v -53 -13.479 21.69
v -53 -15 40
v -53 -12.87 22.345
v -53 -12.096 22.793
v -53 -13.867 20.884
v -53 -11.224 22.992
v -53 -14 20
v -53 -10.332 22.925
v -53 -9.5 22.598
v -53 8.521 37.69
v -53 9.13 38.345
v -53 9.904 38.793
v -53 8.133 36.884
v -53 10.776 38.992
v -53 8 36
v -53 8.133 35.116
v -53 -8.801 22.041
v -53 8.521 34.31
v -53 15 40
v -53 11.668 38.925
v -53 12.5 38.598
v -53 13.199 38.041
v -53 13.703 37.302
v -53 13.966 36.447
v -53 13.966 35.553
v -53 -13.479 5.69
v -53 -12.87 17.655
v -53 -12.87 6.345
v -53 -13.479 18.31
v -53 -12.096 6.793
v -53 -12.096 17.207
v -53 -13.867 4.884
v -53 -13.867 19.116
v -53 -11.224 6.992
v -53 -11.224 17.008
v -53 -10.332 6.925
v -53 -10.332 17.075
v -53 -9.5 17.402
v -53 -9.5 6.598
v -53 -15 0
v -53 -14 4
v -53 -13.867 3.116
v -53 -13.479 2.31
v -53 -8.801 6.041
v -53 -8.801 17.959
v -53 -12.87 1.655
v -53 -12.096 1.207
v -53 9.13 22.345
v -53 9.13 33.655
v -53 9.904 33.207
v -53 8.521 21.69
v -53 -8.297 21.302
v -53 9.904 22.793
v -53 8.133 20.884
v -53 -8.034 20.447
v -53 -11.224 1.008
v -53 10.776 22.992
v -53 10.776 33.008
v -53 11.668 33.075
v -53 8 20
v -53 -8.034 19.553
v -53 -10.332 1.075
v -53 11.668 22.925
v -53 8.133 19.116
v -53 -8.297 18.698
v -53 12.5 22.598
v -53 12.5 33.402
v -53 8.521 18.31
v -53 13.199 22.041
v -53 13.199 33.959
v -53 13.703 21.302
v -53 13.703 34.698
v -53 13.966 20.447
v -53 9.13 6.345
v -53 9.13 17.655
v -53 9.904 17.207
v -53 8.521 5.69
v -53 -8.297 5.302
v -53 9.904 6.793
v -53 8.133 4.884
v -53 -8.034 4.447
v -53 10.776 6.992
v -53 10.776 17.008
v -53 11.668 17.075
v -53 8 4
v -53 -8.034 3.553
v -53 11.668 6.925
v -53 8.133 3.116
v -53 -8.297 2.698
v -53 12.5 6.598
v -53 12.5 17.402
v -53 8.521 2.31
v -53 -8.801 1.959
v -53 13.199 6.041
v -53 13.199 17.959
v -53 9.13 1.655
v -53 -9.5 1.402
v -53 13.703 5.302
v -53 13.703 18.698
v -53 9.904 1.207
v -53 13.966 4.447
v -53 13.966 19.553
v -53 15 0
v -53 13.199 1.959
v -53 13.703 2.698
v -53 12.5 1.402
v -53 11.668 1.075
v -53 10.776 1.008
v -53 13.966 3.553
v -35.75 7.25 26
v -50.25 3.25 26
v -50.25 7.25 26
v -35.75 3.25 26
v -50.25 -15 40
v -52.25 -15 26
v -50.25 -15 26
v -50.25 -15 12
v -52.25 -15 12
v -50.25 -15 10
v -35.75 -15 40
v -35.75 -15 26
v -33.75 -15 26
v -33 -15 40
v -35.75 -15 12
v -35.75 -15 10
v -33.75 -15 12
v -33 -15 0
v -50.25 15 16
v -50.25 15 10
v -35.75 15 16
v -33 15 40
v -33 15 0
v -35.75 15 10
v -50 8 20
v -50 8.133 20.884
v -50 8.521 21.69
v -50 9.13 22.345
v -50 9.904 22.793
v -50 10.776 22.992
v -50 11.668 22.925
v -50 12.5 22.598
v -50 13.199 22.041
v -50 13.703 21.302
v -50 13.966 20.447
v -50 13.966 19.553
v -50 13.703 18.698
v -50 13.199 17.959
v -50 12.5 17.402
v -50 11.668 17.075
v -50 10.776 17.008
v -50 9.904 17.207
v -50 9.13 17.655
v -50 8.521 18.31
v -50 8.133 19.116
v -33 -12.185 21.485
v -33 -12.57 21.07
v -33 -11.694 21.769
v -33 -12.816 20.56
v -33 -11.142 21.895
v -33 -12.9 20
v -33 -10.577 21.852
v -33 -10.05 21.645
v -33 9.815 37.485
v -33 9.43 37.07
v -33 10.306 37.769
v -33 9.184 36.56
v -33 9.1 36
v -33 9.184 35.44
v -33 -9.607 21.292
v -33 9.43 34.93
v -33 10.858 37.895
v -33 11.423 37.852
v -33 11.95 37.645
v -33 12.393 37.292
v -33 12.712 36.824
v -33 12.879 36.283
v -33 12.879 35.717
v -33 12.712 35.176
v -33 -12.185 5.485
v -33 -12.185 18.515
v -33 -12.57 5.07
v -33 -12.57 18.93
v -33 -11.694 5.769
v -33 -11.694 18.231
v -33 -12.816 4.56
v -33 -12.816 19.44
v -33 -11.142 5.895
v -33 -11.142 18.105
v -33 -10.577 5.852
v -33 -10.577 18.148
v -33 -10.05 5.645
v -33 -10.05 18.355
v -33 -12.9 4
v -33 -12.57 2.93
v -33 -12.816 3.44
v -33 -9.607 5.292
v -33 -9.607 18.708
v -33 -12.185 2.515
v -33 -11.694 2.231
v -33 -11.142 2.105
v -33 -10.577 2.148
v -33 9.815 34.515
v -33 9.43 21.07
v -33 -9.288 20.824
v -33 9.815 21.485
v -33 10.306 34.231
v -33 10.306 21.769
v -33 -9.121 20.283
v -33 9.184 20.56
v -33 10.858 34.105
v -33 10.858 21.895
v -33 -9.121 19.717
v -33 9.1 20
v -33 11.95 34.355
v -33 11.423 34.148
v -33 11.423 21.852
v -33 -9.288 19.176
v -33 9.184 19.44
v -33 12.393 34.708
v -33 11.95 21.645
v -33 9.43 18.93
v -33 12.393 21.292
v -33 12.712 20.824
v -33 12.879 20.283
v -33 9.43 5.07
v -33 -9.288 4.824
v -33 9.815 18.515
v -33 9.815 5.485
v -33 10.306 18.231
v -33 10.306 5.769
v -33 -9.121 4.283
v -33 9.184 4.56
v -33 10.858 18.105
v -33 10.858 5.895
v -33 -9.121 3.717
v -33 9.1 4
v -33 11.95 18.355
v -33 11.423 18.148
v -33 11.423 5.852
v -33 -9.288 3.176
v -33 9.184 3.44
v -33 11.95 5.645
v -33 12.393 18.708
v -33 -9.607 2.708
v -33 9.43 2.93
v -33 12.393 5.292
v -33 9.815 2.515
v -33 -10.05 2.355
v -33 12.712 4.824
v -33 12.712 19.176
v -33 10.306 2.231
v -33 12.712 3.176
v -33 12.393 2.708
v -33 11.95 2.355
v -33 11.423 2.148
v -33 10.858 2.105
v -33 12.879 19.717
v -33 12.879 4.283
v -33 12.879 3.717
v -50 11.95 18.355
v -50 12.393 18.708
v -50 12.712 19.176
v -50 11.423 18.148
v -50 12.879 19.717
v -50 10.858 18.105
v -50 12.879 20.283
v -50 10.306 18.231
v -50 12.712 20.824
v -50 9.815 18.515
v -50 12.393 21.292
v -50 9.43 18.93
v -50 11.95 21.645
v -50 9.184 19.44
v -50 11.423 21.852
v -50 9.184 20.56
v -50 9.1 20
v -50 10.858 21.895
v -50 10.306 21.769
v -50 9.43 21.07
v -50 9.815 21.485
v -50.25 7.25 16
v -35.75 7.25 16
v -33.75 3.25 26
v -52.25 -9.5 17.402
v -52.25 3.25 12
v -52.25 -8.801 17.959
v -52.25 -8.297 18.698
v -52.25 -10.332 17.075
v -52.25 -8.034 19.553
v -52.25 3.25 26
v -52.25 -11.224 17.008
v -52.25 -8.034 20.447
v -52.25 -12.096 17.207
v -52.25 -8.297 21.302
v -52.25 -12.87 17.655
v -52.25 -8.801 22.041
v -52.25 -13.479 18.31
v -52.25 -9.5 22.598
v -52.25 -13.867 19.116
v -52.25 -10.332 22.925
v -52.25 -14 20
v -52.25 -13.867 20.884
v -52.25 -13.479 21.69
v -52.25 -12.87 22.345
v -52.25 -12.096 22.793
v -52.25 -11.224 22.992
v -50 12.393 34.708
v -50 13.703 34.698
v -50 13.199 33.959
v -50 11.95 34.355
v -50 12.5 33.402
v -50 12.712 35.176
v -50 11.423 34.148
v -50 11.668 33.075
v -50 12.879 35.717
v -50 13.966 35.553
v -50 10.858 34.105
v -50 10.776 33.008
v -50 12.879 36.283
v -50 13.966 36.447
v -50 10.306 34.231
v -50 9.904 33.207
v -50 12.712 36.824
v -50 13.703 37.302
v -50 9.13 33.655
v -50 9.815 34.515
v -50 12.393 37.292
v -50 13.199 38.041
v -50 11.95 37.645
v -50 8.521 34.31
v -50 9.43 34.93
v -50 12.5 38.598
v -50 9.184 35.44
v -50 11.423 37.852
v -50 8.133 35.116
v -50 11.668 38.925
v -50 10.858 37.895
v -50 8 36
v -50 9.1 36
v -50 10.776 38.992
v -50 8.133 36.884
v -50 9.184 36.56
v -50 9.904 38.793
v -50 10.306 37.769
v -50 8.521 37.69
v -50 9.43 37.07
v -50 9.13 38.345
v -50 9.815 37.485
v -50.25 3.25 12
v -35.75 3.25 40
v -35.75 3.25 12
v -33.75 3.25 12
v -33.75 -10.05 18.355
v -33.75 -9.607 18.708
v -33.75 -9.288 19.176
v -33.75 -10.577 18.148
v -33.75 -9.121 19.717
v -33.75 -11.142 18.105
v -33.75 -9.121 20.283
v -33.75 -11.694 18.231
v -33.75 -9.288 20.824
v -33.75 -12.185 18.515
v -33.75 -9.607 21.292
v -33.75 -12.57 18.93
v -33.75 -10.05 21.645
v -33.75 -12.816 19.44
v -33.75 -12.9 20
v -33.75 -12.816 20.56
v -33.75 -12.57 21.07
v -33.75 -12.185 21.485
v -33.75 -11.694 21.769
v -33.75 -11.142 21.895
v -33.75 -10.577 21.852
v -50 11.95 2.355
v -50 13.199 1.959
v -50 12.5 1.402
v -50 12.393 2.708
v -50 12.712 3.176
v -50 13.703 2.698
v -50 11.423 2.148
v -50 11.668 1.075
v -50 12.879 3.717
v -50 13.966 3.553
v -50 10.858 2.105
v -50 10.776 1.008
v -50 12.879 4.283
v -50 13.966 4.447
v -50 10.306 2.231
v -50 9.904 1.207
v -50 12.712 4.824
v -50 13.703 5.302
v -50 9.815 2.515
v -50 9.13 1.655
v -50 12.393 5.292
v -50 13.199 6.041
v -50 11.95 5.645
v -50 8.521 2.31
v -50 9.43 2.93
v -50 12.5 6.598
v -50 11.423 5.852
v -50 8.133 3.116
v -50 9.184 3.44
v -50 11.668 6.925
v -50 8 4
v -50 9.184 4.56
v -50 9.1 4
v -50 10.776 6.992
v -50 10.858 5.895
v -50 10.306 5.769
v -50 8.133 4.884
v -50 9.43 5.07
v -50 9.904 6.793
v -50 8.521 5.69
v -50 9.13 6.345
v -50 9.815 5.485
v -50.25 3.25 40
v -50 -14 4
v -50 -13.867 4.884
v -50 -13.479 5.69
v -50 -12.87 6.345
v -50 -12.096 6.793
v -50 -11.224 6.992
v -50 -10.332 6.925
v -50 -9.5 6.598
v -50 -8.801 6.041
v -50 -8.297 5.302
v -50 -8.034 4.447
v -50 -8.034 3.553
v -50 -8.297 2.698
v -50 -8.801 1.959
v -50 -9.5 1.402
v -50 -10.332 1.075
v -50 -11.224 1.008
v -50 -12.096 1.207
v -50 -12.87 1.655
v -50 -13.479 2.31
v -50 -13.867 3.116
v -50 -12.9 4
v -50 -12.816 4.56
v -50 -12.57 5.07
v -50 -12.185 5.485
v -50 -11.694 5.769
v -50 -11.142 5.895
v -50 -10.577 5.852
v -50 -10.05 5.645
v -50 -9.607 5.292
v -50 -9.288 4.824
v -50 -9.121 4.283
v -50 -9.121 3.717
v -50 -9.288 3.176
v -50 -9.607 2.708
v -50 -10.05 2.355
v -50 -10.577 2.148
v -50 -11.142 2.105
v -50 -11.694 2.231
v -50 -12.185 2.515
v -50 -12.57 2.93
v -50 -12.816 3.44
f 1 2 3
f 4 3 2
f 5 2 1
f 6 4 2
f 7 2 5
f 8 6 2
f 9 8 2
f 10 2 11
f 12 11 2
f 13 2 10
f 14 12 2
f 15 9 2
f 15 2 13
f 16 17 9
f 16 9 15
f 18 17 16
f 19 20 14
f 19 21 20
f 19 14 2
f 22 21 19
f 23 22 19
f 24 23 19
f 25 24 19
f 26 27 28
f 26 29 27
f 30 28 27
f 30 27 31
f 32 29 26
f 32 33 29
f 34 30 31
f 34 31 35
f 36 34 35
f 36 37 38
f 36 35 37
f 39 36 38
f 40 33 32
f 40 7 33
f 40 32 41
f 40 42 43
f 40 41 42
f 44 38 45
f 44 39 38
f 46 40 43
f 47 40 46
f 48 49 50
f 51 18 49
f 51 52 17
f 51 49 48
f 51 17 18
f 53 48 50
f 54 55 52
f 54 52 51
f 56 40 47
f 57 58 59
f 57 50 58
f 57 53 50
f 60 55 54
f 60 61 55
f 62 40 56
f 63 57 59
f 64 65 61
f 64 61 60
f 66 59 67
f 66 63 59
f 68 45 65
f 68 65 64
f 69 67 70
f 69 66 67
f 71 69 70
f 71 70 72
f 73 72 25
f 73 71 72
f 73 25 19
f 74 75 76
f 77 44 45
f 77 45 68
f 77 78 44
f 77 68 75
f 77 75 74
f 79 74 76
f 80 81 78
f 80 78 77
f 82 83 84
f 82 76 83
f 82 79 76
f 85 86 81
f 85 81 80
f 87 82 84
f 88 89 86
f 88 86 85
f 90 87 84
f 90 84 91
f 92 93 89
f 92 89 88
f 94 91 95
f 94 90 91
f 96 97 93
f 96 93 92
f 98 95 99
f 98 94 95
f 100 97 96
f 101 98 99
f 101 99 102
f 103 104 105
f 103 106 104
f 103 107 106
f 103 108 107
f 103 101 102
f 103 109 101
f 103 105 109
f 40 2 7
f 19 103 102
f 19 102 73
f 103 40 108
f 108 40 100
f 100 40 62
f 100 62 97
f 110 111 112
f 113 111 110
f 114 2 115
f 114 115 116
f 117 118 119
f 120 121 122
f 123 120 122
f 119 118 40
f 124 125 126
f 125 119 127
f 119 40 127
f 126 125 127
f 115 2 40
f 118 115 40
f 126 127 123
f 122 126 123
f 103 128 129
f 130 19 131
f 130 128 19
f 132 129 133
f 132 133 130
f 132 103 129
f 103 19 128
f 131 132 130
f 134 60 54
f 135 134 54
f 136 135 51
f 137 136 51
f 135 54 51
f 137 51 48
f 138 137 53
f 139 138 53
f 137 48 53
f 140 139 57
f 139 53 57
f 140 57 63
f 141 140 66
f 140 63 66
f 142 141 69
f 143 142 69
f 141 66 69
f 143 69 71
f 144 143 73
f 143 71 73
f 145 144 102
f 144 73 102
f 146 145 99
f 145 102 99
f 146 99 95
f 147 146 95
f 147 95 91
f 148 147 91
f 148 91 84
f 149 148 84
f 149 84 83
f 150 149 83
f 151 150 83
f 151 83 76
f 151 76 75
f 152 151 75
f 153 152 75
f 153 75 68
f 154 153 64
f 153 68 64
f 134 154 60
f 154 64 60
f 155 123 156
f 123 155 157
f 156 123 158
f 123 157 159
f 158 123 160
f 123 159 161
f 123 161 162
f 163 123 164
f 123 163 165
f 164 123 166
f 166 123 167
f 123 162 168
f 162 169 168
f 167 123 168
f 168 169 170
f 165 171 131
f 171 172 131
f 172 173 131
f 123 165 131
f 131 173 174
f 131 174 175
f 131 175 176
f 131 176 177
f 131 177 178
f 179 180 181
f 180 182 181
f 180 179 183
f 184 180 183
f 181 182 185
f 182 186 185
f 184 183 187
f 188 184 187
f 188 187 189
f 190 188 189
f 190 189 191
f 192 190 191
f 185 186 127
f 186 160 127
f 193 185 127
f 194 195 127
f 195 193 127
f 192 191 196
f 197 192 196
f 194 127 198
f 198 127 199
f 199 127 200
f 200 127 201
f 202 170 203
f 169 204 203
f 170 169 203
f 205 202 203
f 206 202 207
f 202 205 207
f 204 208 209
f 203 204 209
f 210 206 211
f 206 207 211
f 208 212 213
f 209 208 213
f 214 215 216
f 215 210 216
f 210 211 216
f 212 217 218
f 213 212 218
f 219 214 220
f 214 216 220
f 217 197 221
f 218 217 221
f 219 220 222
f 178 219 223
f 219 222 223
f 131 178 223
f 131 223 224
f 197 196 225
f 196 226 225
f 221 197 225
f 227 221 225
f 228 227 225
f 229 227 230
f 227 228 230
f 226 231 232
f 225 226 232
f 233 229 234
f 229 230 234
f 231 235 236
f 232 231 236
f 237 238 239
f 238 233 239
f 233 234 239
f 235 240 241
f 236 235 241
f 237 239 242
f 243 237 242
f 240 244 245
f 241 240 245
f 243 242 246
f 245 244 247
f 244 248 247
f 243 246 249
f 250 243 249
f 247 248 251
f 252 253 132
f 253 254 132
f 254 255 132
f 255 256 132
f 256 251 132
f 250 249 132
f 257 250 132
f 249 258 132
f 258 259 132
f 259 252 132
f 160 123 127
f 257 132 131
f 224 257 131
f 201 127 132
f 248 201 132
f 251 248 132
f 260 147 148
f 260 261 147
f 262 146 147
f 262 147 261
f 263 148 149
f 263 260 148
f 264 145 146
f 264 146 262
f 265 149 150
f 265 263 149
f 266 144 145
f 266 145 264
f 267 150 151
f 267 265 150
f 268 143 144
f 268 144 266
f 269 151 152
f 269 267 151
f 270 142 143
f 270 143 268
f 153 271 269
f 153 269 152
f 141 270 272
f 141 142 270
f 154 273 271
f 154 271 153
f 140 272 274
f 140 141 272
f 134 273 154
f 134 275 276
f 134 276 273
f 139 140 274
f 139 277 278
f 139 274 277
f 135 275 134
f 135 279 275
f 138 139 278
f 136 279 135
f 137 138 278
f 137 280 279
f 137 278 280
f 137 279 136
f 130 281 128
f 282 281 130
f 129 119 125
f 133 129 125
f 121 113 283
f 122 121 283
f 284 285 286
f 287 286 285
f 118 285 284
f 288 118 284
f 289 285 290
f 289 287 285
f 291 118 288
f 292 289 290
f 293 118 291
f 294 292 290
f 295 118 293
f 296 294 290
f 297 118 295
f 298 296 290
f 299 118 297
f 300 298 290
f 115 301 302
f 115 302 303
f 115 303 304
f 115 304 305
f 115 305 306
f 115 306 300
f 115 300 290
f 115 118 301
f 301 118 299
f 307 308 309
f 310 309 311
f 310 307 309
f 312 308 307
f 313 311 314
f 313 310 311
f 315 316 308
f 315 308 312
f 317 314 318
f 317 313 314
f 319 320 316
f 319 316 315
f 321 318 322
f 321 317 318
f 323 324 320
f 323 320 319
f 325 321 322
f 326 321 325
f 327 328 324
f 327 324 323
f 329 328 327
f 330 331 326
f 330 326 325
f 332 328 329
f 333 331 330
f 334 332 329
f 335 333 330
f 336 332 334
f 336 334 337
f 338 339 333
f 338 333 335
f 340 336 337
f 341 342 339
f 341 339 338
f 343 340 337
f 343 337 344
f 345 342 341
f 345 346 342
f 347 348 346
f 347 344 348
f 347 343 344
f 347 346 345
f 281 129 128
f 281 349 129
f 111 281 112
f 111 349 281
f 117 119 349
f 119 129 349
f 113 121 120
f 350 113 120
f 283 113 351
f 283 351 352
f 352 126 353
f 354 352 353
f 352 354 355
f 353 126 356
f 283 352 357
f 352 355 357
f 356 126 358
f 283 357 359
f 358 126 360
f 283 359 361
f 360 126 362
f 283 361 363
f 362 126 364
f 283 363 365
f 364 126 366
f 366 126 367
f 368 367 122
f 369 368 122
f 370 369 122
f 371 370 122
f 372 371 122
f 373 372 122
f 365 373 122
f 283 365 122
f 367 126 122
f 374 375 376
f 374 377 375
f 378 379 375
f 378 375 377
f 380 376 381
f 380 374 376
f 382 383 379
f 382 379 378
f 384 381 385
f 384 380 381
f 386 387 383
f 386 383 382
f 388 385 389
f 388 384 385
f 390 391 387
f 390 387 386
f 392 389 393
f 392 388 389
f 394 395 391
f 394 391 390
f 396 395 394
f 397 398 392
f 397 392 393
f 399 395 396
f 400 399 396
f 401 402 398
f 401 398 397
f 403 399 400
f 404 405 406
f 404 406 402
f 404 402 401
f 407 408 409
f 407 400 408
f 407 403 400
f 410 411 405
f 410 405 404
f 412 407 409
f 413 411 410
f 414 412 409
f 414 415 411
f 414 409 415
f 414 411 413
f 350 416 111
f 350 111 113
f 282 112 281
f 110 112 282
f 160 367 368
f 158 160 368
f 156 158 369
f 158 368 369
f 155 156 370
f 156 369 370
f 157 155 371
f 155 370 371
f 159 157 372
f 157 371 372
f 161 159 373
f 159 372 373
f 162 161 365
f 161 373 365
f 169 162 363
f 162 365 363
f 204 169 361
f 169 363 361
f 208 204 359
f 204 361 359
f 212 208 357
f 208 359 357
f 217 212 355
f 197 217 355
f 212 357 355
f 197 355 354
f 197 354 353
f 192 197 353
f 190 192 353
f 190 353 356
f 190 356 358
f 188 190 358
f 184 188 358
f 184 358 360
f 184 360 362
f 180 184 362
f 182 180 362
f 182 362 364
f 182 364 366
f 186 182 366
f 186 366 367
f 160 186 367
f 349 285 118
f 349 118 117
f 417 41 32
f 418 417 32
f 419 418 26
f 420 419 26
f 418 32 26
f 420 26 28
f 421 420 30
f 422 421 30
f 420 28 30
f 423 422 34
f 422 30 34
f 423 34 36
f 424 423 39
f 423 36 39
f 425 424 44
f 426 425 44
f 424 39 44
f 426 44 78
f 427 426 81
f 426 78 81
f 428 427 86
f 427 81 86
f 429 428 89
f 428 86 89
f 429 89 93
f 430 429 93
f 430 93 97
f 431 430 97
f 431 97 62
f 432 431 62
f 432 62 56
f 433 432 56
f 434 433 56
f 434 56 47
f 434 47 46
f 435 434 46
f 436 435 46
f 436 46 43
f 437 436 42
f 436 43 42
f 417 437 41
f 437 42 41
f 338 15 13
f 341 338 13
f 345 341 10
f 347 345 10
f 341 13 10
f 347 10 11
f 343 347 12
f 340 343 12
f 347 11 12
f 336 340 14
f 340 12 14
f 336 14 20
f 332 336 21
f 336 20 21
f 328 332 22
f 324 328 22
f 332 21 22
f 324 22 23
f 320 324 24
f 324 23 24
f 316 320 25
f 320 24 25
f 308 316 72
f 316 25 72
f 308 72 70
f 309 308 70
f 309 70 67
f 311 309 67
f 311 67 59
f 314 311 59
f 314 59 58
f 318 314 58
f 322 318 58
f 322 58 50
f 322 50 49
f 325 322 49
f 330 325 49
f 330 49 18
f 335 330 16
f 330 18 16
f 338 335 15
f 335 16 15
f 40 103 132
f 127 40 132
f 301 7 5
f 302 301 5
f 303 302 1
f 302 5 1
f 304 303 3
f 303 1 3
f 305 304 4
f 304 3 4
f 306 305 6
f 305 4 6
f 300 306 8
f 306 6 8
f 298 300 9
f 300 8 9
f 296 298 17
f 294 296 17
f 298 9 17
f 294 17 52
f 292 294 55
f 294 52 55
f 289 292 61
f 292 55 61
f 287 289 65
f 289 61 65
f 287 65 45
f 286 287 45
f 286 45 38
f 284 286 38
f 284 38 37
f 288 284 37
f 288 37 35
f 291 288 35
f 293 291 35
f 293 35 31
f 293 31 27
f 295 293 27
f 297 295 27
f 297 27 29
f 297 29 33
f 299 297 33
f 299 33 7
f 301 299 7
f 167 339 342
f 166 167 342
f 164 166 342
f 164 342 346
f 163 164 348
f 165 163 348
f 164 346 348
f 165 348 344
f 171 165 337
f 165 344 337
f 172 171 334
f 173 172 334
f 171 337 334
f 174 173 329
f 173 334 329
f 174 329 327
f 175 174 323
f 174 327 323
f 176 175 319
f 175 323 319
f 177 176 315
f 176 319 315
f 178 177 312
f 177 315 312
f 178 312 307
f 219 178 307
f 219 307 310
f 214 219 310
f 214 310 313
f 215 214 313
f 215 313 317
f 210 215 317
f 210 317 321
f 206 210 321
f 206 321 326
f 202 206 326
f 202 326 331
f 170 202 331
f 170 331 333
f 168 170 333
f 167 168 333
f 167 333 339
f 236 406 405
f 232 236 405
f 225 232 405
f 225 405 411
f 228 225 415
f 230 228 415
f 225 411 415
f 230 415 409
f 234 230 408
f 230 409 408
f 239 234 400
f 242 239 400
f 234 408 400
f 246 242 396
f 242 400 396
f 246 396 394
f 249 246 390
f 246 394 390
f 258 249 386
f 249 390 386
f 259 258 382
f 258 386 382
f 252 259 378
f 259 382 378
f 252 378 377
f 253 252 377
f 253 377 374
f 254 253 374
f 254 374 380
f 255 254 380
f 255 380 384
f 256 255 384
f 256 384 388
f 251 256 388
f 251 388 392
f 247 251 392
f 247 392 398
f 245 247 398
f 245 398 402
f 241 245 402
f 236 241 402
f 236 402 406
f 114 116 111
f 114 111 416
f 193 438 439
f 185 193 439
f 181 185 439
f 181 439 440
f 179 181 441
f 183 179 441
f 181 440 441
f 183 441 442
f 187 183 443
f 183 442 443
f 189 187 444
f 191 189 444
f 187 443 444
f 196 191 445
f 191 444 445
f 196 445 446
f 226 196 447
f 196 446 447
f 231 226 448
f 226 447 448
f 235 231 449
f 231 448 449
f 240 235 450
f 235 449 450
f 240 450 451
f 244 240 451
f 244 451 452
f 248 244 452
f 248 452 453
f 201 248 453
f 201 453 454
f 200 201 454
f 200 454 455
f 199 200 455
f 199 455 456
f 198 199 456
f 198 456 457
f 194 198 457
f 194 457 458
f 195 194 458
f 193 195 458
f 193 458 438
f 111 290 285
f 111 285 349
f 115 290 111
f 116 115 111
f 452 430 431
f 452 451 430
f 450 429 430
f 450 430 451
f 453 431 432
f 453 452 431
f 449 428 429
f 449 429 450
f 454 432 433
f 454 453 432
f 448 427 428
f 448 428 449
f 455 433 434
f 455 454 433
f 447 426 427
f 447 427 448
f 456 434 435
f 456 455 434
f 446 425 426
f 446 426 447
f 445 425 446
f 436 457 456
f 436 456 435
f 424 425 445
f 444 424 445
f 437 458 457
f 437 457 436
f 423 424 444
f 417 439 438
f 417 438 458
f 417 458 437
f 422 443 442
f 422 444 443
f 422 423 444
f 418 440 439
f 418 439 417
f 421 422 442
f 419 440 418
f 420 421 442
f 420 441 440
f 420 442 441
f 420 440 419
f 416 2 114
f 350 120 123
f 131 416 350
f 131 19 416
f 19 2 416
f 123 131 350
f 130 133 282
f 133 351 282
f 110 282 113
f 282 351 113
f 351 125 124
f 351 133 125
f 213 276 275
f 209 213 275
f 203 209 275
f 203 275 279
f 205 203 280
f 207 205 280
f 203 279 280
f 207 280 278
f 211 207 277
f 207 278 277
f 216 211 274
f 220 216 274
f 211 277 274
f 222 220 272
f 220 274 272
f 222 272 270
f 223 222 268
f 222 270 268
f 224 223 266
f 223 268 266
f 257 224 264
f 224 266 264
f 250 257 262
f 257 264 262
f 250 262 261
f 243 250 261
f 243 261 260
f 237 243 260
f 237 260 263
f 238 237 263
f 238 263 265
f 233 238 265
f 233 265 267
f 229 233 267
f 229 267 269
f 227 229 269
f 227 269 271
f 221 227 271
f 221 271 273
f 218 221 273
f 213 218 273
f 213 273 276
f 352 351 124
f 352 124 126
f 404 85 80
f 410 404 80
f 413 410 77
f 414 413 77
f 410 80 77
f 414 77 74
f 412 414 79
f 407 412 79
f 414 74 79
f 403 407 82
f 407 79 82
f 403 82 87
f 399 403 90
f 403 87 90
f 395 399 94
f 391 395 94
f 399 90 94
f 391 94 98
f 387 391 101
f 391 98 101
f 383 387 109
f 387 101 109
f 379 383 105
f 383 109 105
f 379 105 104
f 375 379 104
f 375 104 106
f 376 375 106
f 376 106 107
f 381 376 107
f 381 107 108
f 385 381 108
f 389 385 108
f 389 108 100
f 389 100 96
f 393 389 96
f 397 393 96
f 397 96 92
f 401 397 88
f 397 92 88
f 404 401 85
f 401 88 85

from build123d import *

# Parameters (mm, degrees)
SKETCH026_W     = 20
SKETCH026_H     = 30
PAD008_DEPTH    = 40
SKETCH027_R     = 1.9
POCKET018_DEPTH = 20.001
SKETCH028_R     = 3
POCKET019_DEPTH = 3
SKETCH029_R     = 0.5
POCKET020_DEPTH = 0.5
SKETCH030_W     = 14.5
SKETCH030_H     = 14.5
POCKET021_DEPTH = 30
SKETCH031_W     = 14.5
SKETCH031_H     = 30
POCKET022_DEPTH = 5
SKETCH032_W     = 14.5
SKETCH032_H     = 6
POCKET023_DEPTH = 11.751
SKETCH033_W     = 2
SKETCH033_H     = 14
POCKET024_DEPTH = 18.25
SKETCH034_W     = 14.5
SKETCH034_H     = 10
POCKET025_DEPTH = 4


with BuildPart() as part:
    # Sketch026 → Pad008 (new body)
    with BuildSketch(Plane.XY):
        with Locations((-43, 0)):
            Rectangle(SKETCH026_W, SKETCH026_H)
    extrude(amount=PAD008_DEPTH)

    # Sketch027 (on Face4 of Pad008) → Pocket018 (cut, through all)
    with BuildSketch(Plane(origin=(-53, 0, 0), x_dir=(0, -1, 0), z_dir=(-1, 0, 0))):
        with Locations((-11, 36)):
            Circle(SKETCH027_R)
        with Locations((11, 20)):
            Circle(SKETCH027_R)
        with Locations((-11, 20)):
            Circle(SKETCH027_R)
        with Locations((-11, 4)):
            Circle(SKETCH027_R)
        with Locations((11, 4)):
            Circle(SKETCH027_R)
    extrude(amount=-POCKET018_DEPTH, mode=Mode.SUBTRACT)

    # Sketch028 (on Face2 of Pocket018) → Pocket019 (cut)
    with BuildSketch(Plane(origin=(-53, 0, 0), x_dir=(0, -1, 0), z_dir=(-1, 0, 0))):
        with Locations((-11, 36)):
            Circle(SKETCH028_R)
        with Locations((-11, 20)):
            Circle(SKETCH028_R)
        with Locations((-11, 4)):
            Circle(SKETCH028_R)
        with Locations((11, 4)):
            Circle(SKETCH028_R)
        with Locations((11, 20)):
            Circle(SKETCH028_R)
    extrude(amount=-POCKET019_DEPTH, mode=Mode.SUBTRACT)

    # Sketch029 (on Face5 of Pocket019) → Pocket020 (cut)
    with BuildSketch(Plane.XY.offset(40)):
        with Locations((-43, -4)):
            Circle(SKETCH029_R)
    extrude(amount=-POCKET020_DEPTH, mode=Mode.SUBTRACT)

    # Sketch030 (on Face5 of Pocket020) → Pocket021 (cut)
    with BuildSketch(Plane.XY.offset(40)):
        with Locations((-43, -4)):
            Rectangle(SKETCH030_W, SKETCH030_H)
    extrude(amount=-POCKET021_DEPTH, mode=Mode.SUBTRACT)

    # Sketch031 (on Face6 of Pocket021) → Pocket022 (cut)
    with BuildSketch(Plane.XZ.offset(15)):
        with Locations((-43, 25)):
            Rectangle(SKETCH031_W, SKETCH031_H)
    extrude(amount=-POCKET022_DEPTH, mode=Mode.SUBTRACT)

    # Sketch032 (on Face17 of Pocket022) → Pocket023 (cut, through all)
    with BuildSketch(Plane.XZ.offset(-3.25)):
        with Locations((-43, 13)):
            Rectangle(SKETCH032_W, SKETCH032_H)
    extrude(amount=-POCKET023_DEPTH, mode=Mode.SUBTRACT)

    # Sketch033 (on Face7 of Pocket023) → Pocket024 (cut)
    with BuildSketch(Plane.XZ.offset(15)):
        with Locations((-51.25, 19)):
            Rectangle(SKETCH033_W, SKETCH033_H)
        with Locations((-34.75, 19)):
            Rectangle(SKETCH033_W, SKETCH033_H)
    extrude(amount=-POCKET024_DEPTH, mode=Mode.SUBTRACT)

    # Sketch034 (on Face33 of Pocket024) → Pocket025 (cut)
    with BuildSketch(Plane.XZ.offset(-3.25)):
        with Locations((-43, 21)):
            Rectangle(SKETCH034_W, SKETCH034_H)
    extrude(amount=-POCKET025_DEPTH, mode=Mode.SUBTRACT)


solid = part.part
